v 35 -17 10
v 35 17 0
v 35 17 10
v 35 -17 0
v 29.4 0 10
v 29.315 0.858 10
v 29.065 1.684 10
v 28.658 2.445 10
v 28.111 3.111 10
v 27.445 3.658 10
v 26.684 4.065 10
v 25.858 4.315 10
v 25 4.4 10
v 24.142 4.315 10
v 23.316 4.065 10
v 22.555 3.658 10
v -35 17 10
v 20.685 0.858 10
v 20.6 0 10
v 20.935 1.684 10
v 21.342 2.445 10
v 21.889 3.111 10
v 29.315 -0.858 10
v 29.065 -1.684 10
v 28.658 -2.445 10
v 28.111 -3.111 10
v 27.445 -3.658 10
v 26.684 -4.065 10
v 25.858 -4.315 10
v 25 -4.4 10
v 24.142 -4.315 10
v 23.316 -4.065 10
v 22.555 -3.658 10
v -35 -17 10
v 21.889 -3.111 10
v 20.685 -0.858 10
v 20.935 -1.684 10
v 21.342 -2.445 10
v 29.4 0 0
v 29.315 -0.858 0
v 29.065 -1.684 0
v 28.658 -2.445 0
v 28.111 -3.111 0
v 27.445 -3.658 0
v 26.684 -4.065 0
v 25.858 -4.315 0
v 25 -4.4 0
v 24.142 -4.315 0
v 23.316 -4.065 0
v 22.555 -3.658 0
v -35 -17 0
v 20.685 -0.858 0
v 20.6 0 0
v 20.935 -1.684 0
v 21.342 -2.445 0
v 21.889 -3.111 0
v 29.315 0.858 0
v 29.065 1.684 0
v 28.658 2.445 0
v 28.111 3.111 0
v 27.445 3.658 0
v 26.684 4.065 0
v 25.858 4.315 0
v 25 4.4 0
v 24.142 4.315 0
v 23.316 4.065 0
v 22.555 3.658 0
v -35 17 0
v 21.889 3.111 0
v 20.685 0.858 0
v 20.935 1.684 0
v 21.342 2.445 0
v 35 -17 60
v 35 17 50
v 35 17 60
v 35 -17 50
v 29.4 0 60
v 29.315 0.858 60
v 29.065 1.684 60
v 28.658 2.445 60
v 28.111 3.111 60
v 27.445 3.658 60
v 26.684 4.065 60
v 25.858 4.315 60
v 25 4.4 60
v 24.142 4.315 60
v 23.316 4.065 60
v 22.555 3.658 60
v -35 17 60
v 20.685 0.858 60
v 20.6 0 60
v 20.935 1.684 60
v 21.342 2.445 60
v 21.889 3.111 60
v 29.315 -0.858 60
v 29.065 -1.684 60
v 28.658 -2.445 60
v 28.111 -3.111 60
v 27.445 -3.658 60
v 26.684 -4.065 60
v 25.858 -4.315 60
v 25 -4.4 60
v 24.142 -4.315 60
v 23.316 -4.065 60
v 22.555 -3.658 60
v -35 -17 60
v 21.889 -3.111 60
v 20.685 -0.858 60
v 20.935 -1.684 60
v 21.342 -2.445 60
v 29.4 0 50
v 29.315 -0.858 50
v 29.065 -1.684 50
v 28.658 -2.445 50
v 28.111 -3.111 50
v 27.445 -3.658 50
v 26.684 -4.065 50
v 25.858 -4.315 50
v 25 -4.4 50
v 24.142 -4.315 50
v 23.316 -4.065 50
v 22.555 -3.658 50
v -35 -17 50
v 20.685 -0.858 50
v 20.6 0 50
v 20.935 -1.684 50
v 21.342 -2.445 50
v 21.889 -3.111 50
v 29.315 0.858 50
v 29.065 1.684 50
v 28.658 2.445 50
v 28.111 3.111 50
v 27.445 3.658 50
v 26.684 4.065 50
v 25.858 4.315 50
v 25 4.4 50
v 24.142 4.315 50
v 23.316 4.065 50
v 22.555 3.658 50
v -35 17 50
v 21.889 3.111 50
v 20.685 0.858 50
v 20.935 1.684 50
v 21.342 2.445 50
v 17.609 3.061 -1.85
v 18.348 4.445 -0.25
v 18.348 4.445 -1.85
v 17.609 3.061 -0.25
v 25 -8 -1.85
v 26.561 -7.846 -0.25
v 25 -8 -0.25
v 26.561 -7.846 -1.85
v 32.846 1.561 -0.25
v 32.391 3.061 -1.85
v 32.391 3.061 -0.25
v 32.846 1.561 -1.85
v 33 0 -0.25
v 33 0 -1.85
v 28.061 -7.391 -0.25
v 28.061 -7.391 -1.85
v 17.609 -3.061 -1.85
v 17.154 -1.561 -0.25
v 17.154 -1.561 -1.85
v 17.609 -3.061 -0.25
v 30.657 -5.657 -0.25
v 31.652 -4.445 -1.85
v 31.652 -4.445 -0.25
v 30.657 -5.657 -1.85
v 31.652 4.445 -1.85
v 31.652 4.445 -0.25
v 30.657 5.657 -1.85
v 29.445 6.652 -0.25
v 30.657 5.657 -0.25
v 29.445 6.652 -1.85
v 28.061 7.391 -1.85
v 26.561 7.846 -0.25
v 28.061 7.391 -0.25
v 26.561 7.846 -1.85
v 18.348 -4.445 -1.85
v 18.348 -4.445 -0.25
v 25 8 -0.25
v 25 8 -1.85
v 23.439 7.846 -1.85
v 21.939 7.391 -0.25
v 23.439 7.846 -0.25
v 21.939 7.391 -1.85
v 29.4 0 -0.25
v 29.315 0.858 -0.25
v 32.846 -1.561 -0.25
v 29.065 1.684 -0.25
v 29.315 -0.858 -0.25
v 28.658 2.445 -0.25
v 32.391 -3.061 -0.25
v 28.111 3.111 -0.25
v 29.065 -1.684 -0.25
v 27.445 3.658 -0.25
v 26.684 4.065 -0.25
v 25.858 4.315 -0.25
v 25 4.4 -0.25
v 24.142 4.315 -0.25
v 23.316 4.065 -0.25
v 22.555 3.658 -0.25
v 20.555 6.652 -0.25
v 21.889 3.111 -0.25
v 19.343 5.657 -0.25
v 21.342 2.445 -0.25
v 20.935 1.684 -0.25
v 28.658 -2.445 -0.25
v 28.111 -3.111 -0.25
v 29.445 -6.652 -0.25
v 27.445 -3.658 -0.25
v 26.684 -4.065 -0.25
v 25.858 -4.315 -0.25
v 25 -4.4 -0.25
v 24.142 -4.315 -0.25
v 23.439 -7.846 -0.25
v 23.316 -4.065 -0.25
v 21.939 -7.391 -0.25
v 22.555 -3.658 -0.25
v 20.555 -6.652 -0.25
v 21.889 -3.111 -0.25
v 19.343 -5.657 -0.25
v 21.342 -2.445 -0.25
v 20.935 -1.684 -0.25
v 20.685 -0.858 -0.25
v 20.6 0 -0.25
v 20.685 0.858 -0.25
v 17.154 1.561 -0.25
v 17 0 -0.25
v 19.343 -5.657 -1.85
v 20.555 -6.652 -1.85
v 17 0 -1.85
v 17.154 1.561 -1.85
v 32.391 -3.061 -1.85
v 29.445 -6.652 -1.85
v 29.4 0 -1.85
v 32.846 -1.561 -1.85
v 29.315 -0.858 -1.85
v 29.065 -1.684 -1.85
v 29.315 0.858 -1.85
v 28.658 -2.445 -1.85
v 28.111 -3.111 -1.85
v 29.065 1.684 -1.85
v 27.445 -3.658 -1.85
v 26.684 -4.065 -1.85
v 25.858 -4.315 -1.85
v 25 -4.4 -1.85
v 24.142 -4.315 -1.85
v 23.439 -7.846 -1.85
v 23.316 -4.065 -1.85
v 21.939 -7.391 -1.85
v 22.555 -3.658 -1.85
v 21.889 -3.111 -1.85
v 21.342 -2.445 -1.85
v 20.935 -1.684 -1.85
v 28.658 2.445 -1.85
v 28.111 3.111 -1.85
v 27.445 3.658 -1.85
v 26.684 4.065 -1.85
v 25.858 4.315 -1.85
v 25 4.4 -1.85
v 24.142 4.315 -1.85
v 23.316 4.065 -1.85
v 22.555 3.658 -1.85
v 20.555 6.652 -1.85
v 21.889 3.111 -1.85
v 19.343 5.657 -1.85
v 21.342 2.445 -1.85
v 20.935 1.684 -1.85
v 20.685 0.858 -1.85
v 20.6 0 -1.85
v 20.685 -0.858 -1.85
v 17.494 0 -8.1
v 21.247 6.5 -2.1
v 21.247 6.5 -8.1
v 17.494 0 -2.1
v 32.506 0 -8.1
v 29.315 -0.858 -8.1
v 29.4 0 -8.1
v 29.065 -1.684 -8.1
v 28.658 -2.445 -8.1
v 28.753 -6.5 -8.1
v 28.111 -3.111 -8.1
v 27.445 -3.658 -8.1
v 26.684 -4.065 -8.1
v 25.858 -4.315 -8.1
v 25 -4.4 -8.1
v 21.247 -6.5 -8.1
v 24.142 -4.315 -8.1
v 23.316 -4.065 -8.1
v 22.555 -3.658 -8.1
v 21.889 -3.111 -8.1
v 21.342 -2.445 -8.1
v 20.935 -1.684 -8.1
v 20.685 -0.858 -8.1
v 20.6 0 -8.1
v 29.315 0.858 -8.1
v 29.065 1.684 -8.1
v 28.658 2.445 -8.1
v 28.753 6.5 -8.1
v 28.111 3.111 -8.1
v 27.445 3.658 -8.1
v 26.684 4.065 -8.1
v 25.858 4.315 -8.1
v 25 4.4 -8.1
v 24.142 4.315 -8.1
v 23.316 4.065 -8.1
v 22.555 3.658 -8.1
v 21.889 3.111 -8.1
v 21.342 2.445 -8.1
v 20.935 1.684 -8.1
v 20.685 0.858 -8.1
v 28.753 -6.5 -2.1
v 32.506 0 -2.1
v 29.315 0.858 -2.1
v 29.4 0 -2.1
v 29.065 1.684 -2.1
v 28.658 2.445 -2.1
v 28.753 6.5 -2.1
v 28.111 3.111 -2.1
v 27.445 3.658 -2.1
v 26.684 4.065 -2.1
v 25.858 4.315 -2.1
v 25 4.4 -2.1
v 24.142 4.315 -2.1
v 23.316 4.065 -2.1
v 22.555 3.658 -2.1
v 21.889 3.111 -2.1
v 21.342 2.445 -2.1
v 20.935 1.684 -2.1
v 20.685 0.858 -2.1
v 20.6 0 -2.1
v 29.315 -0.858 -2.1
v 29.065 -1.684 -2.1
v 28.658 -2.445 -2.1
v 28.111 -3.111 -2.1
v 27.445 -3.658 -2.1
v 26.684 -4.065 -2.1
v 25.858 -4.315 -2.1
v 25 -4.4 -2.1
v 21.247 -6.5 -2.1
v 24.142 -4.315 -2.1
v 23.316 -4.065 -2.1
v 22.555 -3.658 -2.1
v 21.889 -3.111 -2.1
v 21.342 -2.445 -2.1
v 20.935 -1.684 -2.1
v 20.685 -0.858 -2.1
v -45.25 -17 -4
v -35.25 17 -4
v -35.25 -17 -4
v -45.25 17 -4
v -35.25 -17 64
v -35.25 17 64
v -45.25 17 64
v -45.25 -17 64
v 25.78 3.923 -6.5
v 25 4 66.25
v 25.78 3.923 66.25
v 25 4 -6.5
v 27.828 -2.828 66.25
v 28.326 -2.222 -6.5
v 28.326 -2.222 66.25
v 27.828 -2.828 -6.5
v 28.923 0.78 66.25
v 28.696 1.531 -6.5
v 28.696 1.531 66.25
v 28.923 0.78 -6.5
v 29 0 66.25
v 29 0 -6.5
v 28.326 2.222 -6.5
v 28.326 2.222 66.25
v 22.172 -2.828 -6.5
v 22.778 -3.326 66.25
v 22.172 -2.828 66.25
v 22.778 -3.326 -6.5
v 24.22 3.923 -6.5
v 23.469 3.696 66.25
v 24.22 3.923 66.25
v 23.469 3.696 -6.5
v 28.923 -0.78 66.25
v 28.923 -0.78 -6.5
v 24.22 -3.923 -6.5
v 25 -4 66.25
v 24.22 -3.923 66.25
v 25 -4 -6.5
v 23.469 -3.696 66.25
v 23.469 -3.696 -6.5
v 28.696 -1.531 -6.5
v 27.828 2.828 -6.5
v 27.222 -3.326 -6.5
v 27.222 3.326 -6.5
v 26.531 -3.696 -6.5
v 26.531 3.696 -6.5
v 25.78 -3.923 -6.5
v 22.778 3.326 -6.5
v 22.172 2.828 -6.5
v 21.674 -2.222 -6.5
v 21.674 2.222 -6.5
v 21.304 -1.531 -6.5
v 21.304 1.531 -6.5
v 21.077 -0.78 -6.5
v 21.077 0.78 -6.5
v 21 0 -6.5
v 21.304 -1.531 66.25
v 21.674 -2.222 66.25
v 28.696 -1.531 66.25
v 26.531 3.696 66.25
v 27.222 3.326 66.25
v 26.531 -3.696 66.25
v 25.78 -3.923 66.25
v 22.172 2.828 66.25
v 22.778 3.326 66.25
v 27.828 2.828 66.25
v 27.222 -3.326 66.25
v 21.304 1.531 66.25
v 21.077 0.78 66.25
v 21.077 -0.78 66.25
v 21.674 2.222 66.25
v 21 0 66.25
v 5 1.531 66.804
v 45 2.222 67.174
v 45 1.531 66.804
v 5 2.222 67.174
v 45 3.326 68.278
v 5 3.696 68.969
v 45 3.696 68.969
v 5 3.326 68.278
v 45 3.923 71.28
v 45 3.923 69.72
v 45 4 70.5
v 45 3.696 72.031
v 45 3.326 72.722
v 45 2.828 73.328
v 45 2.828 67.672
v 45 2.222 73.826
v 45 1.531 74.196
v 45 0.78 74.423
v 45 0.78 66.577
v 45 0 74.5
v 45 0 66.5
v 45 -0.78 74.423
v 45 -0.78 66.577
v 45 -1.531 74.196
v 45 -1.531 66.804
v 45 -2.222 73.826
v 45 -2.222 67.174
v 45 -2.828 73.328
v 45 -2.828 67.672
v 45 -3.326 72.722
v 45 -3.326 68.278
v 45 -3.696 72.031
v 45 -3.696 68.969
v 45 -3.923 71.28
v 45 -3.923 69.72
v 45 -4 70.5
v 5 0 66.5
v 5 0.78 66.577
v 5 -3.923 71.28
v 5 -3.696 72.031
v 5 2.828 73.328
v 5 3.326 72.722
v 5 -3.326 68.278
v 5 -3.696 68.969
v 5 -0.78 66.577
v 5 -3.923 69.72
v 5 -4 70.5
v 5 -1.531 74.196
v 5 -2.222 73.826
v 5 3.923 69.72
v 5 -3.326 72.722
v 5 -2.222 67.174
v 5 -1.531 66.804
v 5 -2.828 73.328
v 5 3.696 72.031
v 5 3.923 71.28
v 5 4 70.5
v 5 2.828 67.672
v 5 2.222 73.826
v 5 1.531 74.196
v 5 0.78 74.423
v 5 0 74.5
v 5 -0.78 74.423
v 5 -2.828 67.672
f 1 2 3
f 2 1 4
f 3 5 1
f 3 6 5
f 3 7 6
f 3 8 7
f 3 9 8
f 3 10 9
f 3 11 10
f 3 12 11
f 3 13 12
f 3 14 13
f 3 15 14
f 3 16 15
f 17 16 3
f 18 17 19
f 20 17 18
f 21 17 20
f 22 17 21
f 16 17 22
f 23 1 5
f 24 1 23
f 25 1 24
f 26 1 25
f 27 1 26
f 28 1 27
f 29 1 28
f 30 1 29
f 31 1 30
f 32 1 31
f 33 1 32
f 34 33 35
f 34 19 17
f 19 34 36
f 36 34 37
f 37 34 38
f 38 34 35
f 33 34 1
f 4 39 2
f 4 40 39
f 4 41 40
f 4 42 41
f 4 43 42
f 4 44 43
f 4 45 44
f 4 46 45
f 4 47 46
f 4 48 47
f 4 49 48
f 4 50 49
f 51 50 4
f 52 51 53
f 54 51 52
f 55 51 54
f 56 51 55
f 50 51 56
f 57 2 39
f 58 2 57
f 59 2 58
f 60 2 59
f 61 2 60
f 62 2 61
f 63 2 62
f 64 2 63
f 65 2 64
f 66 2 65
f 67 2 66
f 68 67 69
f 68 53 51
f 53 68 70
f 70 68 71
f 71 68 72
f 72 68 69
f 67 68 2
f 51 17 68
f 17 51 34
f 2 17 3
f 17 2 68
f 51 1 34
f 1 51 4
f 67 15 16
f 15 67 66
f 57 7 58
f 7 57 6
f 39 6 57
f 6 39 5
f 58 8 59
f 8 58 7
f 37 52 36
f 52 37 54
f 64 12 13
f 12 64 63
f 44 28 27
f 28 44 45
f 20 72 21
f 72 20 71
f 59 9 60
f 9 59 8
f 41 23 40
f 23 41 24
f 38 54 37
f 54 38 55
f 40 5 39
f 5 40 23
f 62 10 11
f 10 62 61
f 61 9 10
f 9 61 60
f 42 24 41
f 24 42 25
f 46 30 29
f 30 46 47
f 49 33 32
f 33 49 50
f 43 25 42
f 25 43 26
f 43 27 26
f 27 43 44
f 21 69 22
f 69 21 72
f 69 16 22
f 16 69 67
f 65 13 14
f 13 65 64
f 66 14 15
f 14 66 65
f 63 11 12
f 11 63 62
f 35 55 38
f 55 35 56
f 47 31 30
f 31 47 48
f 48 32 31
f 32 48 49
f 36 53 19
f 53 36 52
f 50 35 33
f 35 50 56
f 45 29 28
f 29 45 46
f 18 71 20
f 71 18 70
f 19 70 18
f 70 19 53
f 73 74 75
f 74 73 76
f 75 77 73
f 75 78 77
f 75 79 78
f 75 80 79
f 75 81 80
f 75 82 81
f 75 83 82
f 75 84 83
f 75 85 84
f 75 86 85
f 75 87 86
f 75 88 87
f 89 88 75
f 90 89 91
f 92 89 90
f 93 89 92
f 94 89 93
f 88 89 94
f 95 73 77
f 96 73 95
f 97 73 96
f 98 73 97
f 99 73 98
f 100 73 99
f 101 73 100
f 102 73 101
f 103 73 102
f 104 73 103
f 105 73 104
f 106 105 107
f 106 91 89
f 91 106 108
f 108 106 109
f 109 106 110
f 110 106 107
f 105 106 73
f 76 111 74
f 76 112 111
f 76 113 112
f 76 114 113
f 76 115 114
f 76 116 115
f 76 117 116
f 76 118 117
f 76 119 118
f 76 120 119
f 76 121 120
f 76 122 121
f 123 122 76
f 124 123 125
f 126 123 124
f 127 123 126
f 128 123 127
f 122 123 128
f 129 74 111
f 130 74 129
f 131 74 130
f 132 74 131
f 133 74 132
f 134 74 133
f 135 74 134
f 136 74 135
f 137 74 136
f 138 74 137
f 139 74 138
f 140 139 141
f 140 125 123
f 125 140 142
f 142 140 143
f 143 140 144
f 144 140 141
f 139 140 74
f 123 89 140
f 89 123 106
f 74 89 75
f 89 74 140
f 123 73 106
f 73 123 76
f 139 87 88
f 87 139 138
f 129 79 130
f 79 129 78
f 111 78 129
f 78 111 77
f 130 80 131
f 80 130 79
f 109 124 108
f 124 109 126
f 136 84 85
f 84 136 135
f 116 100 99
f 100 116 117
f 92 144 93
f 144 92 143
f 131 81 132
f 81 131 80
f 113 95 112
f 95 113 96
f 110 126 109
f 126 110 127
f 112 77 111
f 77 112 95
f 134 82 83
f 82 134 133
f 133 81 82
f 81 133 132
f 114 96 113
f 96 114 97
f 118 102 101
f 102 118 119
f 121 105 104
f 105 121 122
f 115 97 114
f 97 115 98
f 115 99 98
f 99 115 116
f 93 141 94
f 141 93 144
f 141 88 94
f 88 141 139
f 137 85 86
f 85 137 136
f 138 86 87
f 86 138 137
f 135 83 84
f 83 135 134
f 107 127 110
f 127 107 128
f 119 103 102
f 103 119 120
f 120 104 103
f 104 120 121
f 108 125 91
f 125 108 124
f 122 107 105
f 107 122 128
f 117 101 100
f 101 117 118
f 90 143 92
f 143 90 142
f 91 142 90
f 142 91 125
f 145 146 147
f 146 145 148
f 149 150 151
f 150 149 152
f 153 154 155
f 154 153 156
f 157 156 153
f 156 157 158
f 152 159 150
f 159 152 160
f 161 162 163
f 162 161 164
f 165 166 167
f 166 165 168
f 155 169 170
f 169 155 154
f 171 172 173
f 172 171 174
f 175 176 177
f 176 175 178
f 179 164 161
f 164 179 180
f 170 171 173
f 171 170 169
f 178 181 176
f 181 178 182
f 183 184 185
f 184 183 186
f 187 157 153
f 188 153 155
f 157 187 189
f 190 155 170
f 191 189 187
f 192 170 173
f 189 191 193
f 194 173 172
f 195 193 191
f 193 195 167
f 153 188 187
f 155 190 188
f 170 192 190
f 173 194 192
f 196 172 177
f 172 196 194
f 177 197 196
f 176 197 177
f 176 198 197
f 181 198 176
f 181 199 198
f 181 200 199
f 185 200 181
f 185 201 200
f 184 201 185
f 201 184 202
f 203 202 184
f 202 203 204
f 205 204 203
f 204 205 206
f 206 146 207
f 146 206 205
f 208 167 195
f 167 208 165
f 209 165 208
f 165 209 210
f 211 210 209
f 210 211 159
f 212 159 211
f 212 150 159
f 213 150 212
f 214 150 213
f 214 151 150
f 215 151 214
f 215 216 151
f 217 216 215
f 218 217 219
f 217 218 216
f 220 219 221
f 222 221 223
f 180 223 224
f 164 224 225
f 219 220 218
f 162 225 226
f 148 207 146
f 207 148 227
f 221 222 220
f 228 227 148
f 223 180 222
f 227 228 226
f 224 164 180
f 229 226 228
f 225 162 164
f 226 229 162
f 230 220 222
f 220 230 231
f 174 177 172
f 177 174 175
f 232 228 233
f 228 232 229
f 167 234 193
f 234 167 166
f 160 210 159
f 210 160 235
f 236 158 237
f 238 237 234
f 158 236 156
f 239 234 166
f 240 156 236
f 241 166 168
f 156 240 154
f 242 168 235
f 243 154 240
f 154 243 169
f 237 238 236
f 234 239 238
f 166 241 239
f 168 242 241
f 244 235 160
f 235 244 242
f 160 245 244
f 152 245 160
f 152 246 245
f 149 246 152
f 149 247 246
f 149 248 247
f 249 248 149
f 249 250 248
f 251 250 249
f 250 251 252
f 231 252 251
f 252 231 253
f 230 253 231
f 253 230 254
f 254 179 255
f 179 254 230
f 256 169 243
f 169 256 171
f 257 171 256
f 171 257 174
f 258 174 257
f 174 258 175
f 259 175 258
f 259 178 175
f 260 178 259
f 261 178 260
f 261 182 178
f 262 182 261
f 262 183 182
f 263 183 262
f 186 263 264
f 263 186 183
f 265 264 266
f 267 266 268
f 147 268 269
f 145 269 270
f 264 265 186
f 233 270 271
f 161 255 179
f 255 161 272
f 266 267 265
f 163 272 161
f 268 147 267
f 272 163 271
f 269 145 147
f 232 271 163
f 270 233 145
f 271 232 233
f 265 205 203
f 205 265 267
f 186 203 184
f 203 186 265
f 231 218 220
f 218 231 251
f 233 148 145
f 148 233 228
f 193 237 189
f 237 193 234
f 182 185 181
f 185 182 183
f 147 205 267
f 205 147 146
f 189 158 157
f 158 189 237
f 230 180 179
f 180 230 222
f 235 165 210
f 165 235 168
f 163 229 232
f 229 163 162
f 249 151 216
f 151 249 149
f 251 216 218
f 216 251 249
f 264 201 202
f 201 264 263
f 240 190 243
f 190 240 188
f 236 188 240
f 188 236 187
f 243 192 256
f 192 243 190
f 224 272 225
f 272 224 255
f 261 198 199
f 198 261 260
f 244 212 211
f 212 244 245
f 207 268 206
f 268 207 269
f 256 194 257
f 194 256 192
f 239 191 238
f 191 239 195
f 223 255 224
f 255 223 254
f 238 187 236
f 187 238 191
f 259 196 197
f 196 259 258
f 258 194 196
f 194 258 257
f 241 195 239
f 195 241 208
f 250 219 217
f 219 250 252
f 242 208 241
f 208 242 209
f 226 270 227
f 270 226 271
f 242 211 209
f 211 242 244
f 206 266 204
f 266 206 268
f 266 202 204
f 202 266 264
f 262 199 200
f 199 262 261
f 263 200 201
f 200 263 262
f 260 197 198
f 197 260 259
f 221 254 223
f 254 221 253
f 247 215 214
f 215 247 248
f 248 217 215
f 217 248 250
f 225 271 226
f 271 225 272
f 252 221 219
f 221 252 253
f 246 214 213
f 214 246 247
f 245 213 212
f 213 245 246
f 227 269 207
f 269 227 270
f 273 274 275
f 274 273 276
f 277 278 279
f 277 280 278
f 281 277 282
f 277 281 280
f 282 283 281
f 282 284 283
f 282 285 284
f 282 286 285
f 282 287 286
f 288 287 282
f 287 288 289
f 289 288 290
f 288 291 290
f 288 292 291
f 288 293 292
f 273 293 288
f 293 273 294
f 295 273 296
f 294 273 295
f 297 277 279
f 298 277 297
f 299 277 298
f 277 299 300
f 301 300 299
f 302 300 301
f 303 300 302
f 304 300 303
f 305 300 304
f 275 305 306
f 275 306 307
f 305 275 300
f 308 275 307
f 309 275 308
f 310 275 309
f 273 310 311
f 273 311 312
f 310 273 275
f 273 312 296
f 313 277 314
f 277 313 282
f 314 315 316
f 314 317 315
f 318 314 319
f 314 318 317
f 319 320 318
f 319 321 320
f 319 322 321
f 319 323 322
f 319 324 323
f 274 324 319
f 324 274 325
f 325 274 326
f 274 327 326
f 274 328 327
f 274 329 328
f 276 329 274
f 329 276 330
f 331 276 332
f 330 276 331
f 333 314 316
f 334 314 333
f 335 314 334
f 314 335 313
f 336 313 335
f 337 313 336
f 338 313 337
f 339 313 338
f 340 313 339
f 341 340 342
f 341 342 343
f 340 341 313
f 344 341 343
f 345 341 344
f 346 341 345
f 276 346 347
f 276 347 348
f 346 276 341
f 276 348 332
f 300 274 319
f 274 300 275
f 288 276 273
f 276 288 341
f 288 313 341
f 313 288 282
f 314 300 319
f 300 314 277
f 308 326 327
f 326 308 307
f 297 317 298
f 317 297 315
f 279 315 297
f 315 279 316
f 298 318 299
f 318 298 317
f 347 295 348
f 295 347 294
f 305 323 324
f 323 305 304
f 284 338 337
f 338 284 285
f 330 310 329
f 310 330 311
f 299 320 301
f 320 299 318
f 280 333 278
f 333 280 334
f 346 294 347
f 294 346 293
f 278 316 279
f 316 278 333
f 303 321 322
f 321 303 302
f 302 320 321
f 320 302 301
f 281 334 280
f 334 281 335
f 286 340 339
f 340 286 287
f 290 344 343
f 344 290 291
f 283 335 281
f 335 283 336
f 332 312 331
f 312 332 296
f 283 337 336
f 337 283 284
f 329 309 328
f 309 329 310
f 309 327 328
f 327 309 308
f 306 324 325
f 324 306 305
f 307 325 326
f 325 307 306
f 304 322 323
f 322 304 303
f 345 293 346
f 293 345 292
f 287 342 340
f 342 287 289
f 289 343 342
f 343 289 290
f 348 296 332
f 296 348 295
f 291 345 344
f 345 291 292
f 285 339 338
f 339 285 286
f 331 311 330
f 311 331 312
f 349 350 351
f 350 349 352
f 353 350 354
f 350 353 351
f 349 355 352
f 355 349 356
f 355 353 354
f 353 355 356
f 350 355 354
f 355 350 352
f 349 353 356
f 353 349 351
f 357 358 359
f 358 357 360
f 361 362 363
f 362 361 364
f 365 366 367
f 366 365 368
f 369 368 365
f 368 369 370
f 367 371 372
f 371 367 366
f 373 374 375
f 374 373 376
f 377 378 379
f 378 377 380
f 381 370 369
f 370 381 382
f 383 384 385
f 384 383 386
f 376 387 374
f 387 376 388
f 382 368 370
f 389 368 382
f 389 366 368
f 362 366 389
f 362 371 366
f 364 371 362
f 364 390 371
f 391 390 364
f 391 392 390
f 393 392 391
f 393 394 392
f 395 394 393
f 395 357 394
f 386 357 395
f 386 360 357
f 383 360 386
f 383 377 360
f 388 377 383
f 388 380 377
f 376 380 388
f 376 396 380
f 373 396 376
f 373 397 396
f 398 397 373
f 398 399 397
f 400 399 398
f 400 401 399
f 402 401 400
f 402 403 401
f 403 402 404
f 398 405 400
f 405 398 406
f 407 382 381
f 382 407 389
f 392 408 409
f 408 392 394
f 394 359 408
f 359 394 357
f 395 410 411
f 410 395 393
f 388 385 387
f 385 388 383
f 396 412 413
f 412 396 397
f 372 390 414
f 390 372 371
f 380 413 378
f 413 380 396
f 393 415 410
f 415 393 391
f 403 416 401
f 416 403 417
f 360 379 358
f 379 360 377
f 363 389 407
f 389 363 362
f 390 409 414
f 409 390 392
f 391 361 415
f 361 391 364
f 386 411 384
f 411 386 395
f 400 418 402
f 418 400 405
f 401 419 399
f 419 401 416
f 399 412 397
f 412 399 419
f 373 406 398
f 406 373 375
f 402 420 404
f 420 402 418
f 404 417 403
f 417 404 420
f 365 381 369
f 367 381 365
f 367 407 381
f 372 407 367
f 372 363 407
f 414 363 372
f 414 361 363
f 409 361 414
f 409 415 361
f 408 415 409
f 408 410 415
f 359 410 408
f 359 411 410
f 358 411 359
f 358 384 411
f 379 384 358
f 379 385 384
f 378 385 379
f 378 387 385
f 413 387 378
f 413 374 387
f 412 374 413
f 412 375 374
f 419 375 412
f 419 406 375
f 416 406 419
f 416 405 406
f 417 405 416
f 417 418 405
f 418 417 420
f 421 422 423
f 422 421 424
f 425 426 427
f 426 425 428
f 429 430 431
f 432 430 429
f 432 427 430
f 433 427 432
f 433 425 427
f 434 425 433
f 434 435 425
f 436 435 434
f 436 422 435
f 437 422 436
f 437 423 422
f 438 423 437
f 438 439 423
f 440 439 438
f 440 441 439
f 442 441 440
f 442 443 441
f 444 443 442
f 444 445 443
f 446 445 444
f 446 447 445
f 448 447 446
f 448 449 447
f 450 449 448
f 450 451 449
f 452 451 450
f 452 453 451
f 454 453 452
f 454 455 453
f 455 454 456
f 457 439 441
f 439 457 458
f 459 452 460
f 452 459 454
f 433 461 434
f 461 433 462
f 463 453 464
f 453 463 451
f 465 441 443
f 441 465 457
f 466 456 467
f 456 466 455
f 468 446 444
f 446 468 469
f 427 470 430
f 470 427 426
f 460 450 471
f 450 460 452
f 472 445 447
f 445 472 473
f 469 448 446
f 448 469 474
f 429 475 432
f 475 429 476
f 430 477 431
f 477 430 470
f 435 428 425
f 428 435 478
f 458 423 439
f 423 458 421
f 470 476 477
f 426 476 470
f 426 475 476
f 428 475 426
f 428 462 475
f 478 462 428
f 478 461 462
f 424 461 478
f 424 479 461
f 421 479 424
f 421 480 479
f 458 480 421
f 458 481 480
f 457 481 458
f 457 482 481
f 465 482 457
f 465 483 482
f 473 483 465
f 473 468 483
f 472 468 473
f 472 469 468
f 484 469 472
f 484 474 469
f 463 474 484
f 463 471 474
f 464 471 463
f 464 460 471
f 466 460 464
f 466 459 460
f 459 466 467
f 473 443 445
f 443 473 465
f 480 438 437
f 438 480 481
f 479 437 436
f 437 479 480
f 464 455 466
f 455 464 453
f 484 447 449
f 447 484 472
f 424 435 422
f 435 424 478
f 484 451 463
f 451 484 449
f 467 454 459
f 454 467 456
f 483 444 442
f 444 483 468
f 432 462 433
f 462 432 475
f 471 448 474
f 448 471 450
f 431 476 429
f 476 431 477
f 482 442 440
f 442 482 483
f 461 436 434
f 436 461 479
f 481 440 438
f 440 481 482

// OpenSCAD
$fn = 32;

// ------------------------------------------------------------------------
// C clamp: throat 50 mm, screw d8
// Every part is its own module, assembly() places every instance.
// ------------------------------------------------------------------------

// --- part 1 ---
module clamp_arm() {
  difference() {
    translate([-35, -17, 0]) cube([70, 34, 10]);
    translate([25, 0, -1]) cylinder(h = 12, d = 8.8);
  }
}

// --- part 2 ---
module clamp_spine() {
  difference() {
    translate([-34, -17, 0]) cube([68, 34, 10]);
  }
}

// --- part 3 ---
module clamp_screw() {
  translate([0, 0, -36.375]) cylinder(h = 72.75, d = 8);
}

// --- part 4 ---
module clamp_washer() {
  difference() {
      translate([0, 0, 0]) cylinder(h = 1.6, d = 16);
      translate([0, 0, -1]) cylinder(h = 3.6, d = 8.8);
    }
}

// --- part 5 ---
module clamp_nut() {
  difference() {
    linear_extrude(height = 6) polygon(points = [[7.506, 0], [3.753, 6.5], [-3.753, 6.5], [-7.506, 0], [-3.753, -6.5], [3.753, -6.5]]);
    translate([0, 0, -1]) cylinder(h = 8, d = 8.8);
  }
}

// --- part 6 ---
module tommy_bar() {
  translate([0, 0, -20]) cylinder(h = 40, d = 8);
}

// --- assembly ---
module assembly() {
  color([0.80, 0.24, 0.20]) translate([0, 0, 0]) rotate([0, 0, 0]) clamp_arm();
  color([0.20, 0.45, 0.75]) translate([0, 0, 50]) rotate([0, 0, 0]) clamp_arm();
  color([0.25, 0.62, 0.32]) translate([-45.25, 0, 30]) rotate([0, 90, 0]) clamp_spine();
  color([0.92, 0.70, 0.18]) translate([25, 0, 29.875]) rotate([0, 0, 0]) clamp_screw();
  color([0.58, 0.35, 0.70]) translate([25, 0, -1.85]) rotate([0, 0, 0]) clamp_washer();
  color([0.16, 0.66, 0.66]) translate([25, 0, -8.1]) rotate([0, 0, 0]) clamp_nut();
  color([0.85, 0.48, 0.18]) translate([25, 0, 70.5]) rotate([0, 90, 0]) tommy_bar();
}

assembly();
